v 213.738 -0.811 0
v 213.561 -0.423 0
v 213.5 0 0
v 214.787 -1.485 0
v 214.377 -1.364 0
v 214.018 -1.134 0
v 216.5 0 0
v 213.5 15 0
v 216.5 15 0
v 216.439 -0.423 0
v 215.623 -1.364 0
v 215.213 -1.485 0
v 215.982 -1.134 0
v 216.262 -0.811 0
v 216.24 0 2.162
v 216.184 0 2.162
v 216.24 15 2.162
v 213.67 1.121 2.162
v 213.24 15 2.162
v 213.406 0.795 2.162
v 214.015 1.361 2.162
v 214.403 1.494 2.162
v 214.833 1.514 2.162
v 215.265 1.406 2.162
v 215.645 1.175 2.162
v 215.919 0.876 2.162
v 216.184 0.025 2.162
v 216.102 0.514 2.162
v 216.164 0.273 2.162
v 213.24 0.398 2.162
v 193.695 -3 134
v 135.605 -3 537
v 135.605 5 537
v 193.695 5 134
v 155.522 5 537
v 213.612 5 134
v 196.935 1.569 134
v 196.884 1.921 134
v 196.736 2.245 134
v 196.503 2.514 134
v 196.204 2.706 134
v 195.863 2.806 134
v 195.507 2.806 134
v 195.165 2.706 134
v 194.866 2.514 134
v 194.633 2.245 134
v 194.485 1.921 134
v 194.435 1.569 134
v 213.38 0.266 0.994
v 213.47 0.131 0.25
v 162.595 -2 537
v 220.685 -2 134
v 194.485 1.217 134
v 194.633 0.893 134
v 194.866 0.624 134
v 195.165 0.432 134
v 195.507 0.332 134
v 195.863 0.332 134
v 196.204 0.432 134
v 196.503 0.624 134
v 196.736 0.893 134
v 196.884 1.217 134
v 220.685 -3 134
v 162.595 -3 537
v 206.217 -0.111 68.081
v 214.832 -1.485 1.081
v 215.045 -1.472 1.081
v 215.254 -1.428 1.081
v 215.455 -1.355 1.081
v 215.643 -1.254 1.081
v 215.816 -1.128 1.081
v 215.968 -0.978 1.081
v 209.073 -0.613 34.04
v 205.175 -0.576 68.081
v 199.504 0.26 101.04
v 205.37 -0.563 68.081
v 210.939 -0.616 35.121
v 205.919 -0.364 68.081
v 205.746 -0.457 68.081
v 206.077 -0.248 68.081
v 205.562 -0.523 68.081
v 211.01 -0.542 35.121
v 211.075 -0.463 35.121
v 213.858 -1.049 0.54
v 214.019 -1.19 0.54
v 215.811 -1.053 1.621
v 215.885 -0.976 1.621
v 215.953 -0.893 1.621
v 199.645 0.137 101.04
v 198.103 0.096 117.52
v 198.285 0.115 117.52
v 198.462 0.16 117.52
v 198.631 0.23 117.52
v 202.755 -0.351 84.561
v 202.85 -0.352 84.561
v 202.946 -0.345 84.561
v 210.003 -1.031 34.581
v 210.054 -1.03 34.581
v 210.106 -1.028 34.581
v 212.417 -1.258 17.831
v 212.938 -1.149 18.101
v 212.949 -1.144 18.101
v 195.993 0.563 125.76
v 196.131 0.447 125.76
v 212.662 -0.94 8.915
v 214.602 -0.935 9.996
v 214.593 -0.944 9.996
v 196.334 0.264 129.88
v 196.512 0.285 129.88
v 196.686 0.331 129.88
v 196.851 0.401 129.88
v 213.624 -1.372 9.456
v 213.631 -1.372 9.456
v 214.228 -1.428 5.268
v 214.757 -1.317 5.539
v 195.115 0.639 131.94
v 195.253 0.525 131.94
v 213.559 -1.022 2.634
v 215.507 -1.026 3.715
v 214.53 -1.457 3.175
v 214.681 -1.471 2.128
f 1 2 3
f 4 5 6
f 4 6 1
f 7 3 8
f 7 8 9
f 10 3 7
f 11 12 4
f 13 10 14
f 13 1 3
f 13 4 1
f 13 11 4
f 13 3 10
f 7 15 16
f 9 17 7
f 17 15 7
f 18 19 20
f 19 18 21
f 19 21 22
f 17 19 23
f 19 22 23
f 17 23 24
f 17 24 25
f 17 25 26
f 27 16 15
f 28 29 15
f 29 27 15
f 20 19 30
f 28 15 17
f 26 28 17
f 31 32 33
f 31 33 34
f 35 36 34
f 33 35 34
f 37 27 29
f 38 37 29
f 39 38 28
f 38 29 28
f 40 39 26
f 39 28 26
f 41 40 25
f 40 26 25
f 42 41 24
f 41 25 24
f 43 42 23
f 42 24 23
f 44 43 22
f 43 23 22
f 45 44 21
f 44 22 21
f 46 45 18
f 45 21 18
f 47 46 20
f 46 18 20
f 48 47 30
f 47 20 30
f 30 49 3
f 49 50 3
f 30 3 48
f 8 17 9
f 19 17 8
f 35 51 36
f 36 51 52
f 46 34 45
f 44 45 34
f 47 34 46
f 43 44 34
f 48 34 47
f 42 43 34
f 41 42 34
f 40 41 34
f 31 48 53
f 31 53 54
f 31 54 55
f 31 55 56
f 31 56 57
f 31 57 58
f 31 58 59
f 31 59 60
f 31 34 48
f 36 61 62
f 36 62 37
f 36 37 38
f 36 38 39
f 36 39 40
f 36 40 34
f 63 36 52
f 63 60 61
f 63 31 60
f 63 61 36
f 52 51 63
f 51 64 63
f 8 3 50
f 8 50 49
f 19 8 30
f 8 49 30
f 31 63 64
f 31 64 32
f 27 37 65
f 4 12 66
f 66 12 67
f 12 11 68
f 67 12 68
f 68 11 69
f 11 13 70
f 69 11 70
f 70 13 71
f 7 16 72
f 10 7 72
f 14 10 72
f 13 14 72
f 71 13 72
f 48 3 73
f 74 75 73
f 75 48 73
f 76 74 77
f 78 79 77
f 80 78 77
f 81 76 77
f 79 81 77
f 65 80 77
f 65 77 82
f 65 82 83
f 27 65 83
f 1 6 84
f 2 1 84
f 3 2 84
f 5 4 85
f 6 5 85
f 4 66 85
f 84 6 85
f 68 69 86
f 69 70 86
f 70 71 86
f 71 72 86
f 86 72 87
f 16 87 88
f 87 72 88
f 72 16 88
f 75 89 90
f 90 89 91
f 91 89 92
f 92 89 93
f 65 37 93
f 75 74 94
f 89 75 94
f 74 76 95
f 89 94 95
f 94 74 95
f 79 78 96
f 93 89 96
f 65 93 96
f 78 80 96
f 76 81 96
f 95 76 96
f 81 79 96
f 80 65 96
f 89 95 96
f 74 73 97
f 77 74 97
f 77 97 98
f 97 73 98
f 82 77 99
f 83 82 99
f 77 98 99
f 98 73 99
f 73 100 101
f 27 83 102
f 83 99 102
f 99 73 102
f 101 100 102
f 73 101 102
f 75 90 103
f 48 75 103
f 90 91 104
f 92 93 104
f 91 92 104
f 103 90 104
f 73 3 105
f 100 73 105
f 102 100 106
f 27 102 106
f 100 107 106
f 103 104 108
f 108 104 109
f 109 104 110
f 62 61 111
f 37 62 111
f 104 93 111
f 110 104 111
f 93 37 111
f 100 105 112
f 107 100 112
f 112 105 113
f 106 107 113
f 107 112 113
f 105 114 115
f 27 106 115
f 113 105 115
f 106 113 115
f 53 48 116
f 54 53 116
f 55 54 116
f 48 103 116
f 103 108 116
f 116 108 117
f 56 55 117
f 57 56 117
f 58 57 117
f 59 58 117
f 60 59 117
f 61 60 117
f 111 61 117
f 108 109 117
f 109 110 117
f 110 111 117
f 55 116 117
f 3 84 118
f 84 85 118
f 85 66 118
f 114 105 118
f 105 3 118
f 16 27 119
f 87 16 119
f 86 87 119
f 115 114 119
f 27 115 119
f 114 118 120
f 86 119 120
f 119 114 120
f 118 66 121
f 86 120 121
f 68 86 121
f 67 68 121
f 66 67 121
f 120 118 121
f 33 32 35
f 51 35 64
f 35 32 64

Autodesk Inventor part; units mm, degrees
sketch "Sketch1" plane through (0, 0, 0) normal (0, 0, 1) x (1, 0, 0)
  line L0 (0, 0) -> (240, 0)
  line L1 (240, 1.3) -> (240, -1.3)
  line L2 (0, 0) -> (0, 11.6325) construction
  line L3 (0, 11.6325) -> (63.9666, 39.9868) construction
  line L4 (63.9666, 39.9868) -> (240, 1.3) construction
  spline S0 degree 3 poles (0, 0) (0, 11.6325) (63.9666, 39.9868) (240, 1.3) knots 1 1 1 1 2 2 2 2
  line L5 (0, 0) -> (-1.5698, -20.1343) construction
  line L6 (-1.5698, -20.1343) -> (240, -1.3) construction
  spline S1 degree 2 poles (0, 0) (-1.5698, -20.1343) (240, -1.3) knots 1 1 1 2 2 2
  line L7 (10, 0) -> (10, 9.15)
  line L8 (10, 0) -> (10, -6.78)
  line L9 (90, 0) -> (90, 21.9)
  line L10 (90, 0) -> (90, -10.42)
  dimension "d0" = 240
  dimension "d1" = 2.6
  dimension "d2" = 10
  dimension "d3" = 90
  dimension "d4" = 9.15
  dimension "d5" = 6.78
  dimension "d6" = 21.9
  dimension "d7" = 10.42
sketch "Sketch2" plane through (0, 0, 0) normal (0, 1, 0) x (-1, 0, 0)
  line L0 (0, 0) -> (0, 555)
  line L1 (0, 555) -> (-160, 555)
  line L2 (-160, 555) -> (-240, 0)
  dimension "d8" = 555
  dimension "d9" = 160
ref_plane "Work Plane2" through (0, 0, 555) normal (0, 0, 1) x (1, 0, 0)
ref_plane "Work Plane4" through (120.002, 10.5253, 0) normal (0, 0, -1) x (-1, 0, 0)
ref_plane "Work Plane5" through (88, -10.0773, 0) normal (0, 0, -1) x (-1, 0, 0)
ref_plane "Work Plane3" through (240, -1.3, 0) normal (0, 0, -1) x (-1, 0, 0)
ref_plane "Work Plane6" through (192.6847, -3.2567, 134) normal (0, 0, 1) x (1, 0, 0)
sketch "Sketch8" plane through (192.6847, -3.2567, 134) normal (0, 0, 1) x (1, 0, 0)
  circle A0 centre (3, 4.8257) radius 1.25
  line L0 (0, 9.6514) -> (0, 0) projected
  point P0 (-192.6847, 3.2567)
  point P1 (0, 4.8257)
  dimension "d36" = 2.5
  dimension "d37" = 3
  dimension "d38" = 9.6514
sketch "Sketch9" plane through (240, -1.3, 0) normal (0, 0, -1) x (-1, 0, 0)
  circle A0 centre (25, 1.3) radius 1.5
  line L0 (0, 0) -> (0, 2.6) projected
  point P0 (240, 1.3)
  point P1 (0, 1.3)
  point P2 (0, 1.3)
  dimension "d39" = 25
  dimension "d40" = 3
loft "Loft2" add profiles "Sketch8", "Sketch9"
sketch "Sketch10" plane through (0, 0, 0) normal (0, 1, 0) x (-1, 0, 0)
  line L0 (-192.6847, 134) -> (-220.6847, 134) projected
  line L1 (-134.1622, 540) -> (-192.6847, 134) projected
  line L2 (-162.1622, 540) -> (-134.1622, 540) projected
  line L3 (-162.1622, 540) -> (-220.6847, 134)
  line L4 (-134.5946, 537) -> (-162.5946, 537)
  line L5 (-135.6049, 537) -> (-193.695, 134)
  point P0 (0, 0)
  point P1 (-220.2523, 137)
  point P2 (-193.2626, 137)
  dimension "d58" = 3
  dimension "d59" = 1
extrude "Extrusion4" add sketch "Sketch10" along normal blind 5 and the other way blind 3 contours L0 L3 L4 L5
chamfer "Chamfer1" distance 7 angle 45 1 edges at (191.6396, 5, 335.5)
sketch "Sketch13" plane through (0, 0, 0) normal (0, 1, 0) x (-1, 0, 0)
  line L0 (-196.9347, 134) -> (-194.4347, 134) projected
  line L1 (-213.5, 0) -> (-216.5, 0) projected
  line L2 (-213.5, 0) -> (-216.5, 0) projected
  line L3 (-213.5, 0) -> (-213.2396, 2.1617)
  line L4 (-213.2396, 2.1617) -> (-216.2396, 2.1617)
  line L5 (-216.2396, 2.1617) -> (-216.5, 0)
  point P0 (0, 0)
extrude "Extrusion5" add sketch "Sketch13" along normal blind 15
sketch "Sketch14" plane through (0, 0, 0) normal (0, 1, 0) x (-1, 0, 0)
  line L0 (-192.6847, 134) -> (-134.1622, 540) projected
  line L1 (-192.6847, 134) -> (-213.5, -10.4063)
  line L2 (-210.5, 0) -> (-216.5, 0) projected
  line L3 (-195.7157, 134) -> (-137.1932, 540) projected
  point P0 (0, 0)
  point P1 (-213.5, 0)
  point P2 (-215.031, 0)
  dimension "d56" = 3
properties part number "ALA"
